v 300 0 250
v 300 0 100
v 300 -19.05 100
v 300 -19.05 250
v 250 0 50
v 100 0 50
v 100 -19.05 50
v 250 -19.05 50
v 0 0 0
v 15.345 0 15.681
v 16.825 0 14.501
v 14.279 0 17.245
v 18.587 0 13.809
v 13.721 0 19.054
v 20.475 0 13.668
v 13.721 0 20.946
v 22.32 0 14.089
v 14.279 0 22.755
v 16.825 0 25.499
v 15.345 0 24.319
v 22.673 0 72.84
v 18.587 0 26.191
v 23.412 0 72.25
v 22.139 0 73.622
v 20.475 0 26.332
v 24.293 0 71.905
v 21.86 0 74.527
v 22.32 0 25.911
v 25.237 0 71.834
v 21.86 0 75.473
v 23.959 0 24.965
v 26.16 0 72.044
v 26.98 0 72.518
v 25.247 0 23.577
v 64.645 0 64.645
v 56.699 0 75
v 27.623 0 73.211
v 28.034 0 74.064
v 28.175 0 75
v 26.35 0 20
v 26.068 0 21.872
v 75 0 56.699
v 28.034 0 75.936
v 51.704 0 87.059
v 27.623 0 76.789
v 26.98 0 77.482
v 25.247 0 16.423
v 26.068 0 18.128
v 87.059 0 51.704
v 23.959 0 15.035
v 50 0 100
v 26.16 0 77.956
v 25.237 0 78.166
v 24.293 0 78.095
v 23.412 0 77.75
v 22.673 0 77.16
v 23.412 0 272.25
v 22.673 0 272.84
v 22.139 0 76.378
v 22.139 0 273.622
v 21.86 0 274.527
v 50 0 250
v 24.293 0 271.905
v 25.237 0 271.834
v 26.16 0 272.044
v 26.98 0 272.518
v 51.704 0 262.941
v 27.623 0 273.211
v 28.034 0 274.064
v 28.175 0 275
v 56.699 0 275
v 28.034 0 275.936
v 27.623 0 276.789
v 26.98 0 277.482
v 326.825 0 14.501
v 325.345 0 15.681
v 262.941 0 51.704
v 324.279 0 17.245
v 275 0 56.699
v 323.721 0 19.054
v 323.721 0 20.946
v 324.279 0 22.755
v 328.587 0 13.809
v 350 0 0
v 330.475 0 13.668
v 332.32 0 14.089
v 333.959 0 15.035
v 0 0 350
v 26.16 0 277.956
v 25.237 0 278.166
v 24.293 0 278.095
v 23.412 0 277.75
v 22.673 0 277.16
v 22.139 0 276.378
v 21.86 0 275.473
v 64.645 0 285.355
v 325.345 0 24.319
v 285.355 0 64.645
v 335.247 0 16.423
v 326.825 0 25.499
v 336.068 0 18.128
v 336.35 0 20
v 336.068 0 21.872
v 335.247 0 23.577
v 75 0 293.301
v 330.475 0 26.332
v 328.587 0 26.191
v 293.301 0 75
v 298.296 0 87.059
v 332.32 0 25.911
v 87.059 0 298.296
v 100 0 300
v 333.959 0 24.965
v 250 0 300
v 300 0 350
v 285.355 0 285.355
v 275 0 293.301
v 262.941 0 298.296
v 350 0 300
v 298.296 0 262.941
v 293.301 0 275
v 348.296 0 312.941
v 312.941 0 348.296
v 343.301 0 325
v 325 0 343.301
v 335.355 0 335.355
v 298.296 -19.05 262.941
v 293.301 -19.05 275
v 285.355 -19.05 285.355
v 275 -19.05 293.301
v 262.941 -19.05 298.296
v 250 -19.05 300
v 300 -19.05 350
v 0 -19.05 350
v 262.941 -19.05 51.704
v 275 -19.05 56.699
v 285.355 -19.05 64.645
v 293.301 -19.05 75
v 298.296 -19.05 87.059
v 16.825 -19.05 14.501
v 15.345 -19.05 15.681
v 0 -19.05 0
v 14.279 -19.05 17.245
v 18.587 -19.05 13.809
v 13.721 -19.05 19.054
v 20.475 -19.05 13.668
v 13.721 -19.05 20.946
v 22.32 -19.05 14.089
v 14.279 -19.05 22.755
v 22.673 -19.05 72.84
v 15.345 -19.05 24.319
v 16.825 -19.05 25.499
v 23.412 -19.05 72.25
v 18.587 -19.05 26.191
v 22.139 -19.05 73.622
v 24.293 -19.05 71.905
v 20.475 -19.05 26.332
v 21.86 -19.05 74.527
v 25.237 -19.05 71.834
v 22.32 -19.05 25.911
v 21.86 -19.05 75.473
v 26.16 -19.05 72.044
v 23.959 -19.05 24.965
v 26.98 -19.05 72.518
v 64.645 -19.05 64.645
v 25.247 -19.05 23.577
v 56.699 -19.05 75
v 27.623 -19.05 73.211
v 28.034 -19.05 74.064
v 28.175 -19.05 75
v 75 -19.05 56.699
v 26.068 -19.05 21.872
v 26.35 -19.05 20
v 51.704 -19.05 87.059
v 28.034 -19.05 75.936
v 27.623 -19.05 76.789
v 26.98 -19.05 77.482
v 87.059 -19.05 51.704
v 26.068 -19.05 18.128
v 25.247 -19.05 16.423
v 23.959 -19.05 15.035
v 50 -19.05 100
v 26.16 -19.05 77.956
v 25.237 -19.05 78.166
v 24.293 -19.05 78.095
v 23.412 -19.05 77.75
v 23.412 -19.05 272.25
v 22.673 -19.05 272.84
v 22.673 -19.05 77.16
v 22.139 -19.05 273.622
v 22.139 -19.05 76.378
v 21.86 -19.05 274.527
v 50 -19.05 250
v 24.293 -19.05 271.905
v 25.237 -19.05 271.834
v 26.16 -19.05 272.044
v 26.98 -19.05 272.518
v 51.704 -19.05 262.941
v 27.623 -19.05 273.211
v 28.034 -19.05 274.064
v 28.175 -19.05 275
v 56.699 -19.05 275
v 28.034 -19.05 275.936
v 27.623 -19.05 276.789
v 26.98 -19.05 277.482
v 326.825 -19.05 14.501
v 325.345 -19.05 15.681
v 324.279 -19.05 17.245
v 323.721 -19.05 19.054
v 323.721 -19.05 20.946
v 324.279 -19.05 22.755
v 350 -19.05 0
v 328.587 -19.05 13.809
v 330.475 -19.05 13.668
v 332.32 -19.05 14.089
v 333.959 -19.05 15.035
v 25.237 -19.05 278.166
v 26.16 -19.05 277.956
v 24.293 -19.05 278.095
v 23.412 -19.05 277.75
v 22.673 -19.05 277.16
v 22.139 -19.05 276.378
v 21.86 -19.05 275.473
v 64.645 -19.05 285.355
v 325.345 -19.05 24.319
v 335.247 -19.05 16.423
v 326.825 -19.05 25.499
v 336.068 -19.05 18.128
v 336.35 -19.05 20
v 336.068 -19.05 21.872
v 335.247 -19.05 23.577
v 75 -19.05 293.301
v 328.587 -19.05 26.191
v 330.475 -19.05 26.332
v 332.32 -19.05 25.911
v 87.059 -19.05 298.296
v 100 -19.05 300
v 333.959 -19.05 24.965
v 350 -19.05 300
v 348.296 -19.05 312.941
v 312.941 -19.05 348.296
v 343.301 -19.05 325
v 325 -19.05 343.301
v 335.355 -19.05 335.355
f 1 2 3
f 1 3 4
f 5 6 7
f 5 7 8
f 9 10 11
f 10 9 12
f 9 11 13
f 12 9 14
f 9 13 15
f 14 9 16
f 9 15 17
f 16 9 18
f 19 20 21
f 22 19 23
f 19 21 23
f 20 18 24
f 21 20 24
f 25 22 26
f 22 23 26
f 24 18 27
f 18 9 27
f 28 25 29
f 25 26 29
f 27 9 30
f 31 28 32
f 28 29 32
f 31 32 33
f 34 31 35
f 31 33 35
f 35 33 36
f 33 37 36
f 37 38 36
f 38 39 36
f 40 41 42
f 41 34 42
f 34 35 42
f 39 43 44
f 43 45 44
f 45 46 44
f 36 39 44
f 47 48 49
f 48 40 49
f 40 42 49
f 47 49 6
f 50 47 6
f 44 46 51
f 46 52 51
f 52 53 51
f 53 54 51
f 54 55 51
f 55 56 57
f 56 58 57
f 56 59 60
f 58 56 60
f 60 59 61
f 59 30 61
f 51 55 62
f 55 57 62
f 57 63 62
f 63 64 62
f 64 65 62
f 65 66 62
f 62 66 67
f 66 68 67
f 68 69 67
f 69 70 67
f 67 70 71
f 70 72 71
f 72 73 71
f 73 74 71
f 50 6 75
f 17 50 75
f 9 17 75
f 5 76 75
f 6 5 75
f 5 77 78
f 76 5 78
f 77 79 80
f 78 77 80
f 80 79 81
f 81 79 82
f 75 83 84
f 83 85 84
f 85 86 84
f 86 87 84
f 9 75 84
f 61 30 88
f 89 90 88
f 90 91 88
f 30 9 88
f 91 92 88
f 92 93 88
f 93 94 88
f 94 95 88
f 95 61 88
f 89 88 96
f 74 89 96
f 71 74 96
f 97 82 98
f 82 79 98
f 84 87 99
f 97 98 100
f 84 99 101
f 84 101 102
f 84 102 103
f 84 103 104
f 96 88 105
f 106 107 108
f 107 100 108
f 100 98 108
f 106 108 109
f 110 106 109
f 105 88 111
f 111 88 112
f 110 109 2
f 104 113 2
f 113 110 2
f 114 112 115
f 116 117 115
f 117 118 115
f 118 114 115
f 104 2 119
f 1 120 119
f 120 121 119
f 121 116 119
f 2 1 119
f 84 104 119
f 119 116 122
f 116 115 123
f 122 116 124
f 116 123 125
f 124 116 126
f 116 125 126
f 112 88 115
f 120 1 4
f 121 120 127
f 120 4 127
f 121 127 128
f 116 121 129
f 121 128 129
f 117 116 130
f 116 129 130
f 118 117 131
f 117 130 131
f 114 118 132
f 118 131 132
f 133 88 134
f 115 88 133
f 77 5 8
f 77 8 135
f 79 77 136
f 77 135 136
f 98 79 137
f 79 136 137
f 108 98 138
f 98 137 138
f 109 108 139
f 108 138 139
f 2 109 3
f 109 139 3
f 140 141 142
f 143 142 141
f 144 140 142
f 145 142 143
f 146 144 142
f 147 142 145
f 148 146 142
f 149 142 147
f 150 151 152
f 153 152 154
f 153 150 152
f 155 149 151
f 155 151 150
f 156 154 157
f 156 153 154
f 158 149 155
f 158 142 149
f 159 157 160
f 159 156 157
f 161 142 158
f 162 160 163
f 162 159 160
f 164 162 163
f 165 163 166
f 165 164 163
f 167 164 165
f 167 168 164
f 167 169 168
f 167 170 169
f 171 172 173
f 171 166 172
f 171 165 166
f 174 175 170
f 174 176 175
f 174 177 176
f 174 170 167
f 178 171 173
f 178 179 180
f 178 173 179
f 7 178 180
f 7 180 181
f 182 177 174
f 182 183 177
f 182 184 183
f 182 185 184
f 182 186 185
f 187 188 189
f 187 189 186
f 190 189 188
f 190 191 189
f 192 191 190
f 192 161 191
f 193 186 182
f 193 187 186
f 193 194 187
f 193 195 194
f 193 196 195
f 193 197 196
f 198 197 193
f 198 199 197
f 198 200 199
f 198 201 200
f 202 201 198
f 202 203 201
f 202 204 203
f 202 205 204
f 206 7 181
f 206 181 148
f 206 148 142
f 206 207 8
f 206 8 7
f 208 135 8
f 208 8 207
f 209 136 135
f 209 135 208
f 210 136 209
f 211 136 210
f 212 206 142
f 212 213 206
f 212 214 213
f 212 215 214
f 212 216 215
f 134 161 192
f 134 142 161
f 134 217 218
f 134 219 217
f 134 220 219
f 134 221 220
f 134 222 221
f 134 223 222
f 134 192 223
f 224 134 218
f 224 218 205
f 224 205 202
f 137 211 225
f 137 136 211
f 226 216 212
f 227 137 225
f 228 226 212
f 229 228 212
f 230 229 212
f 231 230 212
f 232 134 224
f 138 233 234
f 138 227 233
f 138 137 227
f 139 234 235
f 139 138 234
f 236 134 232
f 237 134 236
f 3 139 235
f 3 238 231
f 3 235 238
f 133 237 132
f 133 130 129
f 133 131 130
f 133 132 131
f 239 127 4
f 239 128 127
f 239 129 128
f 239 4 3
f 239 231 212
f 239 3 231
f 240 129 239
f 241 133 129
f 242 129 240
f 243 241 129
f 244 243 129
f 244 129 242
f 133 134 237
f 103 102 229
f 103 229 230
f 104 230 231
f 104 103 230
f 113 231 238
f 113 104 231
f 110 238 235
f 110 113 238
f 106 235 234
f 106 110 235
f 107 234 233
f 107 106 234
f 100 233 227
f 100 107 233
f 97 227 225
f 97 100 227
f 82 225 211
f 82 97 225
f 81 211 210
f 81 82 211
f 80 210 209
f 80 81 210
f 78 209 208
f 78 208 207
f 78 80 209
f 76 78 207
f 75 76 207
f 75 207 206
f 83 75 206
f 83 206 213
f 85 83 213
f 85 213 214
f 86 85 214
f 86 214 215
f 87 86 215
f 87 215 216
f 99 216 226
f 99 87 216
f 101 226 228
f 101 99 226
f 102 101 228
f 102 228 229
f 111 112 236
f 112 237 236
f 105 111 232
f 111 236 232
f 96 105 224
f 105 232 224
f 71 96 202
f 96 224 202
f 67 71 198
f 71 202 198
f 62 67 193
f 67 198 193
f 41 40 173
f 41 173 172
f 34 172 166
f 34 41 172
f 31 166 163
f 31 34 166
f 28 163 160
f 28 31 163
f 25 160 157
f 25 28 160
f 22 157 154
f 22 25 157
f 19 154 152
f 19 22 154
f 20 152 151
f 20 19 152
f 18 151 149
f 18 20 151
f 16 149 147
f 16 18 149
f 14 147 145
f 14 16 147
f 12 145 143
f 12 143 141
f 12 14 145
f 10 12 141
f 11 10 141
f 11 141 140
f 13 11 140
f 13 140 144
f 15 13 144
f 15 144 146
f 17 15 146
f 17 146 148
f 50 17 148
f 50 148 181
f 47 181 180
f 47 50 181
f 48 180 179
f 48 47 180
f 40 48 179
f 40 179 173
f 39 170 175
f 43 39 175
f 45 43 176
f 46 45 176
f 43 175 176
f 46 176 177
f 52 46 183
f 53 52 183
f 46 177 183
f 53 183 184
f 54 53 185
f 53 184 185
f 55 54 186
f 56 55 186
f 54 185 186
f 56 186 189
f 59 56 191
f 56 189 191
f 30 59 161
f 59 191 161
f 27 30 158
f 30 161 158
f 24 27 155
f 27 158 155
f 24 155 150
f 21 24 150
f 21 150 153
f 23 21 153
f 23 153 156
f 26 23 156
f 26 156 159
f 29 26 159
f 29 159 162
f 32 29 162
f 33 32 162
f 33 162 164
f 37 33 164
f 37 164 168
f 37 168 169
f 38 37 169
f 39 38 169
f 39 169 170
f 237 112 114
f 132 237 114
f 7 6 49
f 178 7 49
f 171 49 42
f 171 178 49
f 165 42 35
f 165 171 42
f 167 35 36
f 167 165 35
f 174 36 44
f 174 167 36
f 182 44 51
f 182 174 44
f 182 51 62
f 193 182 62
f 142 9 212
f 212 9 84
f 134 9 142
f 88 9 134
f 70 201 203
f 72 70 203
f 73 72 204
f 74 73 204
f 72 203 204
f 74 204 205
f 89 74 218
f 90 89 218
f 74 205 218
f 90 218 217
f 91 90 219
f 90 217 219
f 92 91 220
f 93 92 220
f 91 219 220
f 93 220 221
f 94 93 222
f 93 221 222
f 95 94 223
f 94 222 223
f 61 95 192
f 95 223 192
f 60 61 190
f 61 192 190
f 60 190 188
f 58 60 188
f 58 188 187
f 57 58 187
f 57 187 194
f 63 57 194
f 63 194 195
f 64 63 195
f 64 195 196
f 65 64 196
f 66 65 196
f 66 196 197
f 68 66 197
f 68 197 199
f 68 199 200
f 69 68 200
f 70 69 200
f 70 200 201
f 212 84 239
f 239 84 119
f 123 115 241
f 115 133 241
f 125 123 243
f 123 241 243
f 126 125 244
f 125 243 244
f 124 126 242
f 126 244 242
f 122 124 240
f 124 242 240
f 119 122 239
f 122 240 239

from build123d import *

# Parameters (mm, degrees)
F0_W     = 350
F0_H     = 350
F0_R     = 6.35
F0_W_2   = 250
F0_H_2   = 250
F1_DEPTH = 19.05
F2_R     = 50
F3_R     = 3.175
F4_DEPTH = 25


with BuildPart() as f1:
    # F0 (on Front) → F1 (new body)
    with BuildSketch(Plane.XZ):
        with Locations((175, 175)):
            Rectangle(F0_W, F0_H)
        with Locations((20, 20)):
            Circle(F0_R, mode=Mode.SUBTRACT)
        with Locations((330, 20)):
            Circle(F0_R, mode=Mode.SUBTRACT)
        with Locations((175, 175)):
            Rectangle(F0_W_2, F0_H_2, mode=Mode.SUBTRACT)
    extrude(amount=F1_DEPTH)

    # F2
    f2_edges = [f1.edges().sort_by_distance(p)[0] for p in [
        (300, -9.525, 50),
        (300, -9.525, 300),
        (50, -9.525, 300),
        (50, -9.525, 50),
        (350, -9.525, 350),
    ]]
    fillet(f2_edges, radius=F2_R)

    # F3 (on face) → F4 (cut)
    with BuildSketch(Plane.XZ.offset(19.05)):
        with Locations((25, 275)):
            Circle(F3_R)
        with Locations((25, 75)):
            Circle(F3_R)
    extrude(amount=-F4_DEPTH, mode=Mode.SUBTRACT)


solid = f1.part
